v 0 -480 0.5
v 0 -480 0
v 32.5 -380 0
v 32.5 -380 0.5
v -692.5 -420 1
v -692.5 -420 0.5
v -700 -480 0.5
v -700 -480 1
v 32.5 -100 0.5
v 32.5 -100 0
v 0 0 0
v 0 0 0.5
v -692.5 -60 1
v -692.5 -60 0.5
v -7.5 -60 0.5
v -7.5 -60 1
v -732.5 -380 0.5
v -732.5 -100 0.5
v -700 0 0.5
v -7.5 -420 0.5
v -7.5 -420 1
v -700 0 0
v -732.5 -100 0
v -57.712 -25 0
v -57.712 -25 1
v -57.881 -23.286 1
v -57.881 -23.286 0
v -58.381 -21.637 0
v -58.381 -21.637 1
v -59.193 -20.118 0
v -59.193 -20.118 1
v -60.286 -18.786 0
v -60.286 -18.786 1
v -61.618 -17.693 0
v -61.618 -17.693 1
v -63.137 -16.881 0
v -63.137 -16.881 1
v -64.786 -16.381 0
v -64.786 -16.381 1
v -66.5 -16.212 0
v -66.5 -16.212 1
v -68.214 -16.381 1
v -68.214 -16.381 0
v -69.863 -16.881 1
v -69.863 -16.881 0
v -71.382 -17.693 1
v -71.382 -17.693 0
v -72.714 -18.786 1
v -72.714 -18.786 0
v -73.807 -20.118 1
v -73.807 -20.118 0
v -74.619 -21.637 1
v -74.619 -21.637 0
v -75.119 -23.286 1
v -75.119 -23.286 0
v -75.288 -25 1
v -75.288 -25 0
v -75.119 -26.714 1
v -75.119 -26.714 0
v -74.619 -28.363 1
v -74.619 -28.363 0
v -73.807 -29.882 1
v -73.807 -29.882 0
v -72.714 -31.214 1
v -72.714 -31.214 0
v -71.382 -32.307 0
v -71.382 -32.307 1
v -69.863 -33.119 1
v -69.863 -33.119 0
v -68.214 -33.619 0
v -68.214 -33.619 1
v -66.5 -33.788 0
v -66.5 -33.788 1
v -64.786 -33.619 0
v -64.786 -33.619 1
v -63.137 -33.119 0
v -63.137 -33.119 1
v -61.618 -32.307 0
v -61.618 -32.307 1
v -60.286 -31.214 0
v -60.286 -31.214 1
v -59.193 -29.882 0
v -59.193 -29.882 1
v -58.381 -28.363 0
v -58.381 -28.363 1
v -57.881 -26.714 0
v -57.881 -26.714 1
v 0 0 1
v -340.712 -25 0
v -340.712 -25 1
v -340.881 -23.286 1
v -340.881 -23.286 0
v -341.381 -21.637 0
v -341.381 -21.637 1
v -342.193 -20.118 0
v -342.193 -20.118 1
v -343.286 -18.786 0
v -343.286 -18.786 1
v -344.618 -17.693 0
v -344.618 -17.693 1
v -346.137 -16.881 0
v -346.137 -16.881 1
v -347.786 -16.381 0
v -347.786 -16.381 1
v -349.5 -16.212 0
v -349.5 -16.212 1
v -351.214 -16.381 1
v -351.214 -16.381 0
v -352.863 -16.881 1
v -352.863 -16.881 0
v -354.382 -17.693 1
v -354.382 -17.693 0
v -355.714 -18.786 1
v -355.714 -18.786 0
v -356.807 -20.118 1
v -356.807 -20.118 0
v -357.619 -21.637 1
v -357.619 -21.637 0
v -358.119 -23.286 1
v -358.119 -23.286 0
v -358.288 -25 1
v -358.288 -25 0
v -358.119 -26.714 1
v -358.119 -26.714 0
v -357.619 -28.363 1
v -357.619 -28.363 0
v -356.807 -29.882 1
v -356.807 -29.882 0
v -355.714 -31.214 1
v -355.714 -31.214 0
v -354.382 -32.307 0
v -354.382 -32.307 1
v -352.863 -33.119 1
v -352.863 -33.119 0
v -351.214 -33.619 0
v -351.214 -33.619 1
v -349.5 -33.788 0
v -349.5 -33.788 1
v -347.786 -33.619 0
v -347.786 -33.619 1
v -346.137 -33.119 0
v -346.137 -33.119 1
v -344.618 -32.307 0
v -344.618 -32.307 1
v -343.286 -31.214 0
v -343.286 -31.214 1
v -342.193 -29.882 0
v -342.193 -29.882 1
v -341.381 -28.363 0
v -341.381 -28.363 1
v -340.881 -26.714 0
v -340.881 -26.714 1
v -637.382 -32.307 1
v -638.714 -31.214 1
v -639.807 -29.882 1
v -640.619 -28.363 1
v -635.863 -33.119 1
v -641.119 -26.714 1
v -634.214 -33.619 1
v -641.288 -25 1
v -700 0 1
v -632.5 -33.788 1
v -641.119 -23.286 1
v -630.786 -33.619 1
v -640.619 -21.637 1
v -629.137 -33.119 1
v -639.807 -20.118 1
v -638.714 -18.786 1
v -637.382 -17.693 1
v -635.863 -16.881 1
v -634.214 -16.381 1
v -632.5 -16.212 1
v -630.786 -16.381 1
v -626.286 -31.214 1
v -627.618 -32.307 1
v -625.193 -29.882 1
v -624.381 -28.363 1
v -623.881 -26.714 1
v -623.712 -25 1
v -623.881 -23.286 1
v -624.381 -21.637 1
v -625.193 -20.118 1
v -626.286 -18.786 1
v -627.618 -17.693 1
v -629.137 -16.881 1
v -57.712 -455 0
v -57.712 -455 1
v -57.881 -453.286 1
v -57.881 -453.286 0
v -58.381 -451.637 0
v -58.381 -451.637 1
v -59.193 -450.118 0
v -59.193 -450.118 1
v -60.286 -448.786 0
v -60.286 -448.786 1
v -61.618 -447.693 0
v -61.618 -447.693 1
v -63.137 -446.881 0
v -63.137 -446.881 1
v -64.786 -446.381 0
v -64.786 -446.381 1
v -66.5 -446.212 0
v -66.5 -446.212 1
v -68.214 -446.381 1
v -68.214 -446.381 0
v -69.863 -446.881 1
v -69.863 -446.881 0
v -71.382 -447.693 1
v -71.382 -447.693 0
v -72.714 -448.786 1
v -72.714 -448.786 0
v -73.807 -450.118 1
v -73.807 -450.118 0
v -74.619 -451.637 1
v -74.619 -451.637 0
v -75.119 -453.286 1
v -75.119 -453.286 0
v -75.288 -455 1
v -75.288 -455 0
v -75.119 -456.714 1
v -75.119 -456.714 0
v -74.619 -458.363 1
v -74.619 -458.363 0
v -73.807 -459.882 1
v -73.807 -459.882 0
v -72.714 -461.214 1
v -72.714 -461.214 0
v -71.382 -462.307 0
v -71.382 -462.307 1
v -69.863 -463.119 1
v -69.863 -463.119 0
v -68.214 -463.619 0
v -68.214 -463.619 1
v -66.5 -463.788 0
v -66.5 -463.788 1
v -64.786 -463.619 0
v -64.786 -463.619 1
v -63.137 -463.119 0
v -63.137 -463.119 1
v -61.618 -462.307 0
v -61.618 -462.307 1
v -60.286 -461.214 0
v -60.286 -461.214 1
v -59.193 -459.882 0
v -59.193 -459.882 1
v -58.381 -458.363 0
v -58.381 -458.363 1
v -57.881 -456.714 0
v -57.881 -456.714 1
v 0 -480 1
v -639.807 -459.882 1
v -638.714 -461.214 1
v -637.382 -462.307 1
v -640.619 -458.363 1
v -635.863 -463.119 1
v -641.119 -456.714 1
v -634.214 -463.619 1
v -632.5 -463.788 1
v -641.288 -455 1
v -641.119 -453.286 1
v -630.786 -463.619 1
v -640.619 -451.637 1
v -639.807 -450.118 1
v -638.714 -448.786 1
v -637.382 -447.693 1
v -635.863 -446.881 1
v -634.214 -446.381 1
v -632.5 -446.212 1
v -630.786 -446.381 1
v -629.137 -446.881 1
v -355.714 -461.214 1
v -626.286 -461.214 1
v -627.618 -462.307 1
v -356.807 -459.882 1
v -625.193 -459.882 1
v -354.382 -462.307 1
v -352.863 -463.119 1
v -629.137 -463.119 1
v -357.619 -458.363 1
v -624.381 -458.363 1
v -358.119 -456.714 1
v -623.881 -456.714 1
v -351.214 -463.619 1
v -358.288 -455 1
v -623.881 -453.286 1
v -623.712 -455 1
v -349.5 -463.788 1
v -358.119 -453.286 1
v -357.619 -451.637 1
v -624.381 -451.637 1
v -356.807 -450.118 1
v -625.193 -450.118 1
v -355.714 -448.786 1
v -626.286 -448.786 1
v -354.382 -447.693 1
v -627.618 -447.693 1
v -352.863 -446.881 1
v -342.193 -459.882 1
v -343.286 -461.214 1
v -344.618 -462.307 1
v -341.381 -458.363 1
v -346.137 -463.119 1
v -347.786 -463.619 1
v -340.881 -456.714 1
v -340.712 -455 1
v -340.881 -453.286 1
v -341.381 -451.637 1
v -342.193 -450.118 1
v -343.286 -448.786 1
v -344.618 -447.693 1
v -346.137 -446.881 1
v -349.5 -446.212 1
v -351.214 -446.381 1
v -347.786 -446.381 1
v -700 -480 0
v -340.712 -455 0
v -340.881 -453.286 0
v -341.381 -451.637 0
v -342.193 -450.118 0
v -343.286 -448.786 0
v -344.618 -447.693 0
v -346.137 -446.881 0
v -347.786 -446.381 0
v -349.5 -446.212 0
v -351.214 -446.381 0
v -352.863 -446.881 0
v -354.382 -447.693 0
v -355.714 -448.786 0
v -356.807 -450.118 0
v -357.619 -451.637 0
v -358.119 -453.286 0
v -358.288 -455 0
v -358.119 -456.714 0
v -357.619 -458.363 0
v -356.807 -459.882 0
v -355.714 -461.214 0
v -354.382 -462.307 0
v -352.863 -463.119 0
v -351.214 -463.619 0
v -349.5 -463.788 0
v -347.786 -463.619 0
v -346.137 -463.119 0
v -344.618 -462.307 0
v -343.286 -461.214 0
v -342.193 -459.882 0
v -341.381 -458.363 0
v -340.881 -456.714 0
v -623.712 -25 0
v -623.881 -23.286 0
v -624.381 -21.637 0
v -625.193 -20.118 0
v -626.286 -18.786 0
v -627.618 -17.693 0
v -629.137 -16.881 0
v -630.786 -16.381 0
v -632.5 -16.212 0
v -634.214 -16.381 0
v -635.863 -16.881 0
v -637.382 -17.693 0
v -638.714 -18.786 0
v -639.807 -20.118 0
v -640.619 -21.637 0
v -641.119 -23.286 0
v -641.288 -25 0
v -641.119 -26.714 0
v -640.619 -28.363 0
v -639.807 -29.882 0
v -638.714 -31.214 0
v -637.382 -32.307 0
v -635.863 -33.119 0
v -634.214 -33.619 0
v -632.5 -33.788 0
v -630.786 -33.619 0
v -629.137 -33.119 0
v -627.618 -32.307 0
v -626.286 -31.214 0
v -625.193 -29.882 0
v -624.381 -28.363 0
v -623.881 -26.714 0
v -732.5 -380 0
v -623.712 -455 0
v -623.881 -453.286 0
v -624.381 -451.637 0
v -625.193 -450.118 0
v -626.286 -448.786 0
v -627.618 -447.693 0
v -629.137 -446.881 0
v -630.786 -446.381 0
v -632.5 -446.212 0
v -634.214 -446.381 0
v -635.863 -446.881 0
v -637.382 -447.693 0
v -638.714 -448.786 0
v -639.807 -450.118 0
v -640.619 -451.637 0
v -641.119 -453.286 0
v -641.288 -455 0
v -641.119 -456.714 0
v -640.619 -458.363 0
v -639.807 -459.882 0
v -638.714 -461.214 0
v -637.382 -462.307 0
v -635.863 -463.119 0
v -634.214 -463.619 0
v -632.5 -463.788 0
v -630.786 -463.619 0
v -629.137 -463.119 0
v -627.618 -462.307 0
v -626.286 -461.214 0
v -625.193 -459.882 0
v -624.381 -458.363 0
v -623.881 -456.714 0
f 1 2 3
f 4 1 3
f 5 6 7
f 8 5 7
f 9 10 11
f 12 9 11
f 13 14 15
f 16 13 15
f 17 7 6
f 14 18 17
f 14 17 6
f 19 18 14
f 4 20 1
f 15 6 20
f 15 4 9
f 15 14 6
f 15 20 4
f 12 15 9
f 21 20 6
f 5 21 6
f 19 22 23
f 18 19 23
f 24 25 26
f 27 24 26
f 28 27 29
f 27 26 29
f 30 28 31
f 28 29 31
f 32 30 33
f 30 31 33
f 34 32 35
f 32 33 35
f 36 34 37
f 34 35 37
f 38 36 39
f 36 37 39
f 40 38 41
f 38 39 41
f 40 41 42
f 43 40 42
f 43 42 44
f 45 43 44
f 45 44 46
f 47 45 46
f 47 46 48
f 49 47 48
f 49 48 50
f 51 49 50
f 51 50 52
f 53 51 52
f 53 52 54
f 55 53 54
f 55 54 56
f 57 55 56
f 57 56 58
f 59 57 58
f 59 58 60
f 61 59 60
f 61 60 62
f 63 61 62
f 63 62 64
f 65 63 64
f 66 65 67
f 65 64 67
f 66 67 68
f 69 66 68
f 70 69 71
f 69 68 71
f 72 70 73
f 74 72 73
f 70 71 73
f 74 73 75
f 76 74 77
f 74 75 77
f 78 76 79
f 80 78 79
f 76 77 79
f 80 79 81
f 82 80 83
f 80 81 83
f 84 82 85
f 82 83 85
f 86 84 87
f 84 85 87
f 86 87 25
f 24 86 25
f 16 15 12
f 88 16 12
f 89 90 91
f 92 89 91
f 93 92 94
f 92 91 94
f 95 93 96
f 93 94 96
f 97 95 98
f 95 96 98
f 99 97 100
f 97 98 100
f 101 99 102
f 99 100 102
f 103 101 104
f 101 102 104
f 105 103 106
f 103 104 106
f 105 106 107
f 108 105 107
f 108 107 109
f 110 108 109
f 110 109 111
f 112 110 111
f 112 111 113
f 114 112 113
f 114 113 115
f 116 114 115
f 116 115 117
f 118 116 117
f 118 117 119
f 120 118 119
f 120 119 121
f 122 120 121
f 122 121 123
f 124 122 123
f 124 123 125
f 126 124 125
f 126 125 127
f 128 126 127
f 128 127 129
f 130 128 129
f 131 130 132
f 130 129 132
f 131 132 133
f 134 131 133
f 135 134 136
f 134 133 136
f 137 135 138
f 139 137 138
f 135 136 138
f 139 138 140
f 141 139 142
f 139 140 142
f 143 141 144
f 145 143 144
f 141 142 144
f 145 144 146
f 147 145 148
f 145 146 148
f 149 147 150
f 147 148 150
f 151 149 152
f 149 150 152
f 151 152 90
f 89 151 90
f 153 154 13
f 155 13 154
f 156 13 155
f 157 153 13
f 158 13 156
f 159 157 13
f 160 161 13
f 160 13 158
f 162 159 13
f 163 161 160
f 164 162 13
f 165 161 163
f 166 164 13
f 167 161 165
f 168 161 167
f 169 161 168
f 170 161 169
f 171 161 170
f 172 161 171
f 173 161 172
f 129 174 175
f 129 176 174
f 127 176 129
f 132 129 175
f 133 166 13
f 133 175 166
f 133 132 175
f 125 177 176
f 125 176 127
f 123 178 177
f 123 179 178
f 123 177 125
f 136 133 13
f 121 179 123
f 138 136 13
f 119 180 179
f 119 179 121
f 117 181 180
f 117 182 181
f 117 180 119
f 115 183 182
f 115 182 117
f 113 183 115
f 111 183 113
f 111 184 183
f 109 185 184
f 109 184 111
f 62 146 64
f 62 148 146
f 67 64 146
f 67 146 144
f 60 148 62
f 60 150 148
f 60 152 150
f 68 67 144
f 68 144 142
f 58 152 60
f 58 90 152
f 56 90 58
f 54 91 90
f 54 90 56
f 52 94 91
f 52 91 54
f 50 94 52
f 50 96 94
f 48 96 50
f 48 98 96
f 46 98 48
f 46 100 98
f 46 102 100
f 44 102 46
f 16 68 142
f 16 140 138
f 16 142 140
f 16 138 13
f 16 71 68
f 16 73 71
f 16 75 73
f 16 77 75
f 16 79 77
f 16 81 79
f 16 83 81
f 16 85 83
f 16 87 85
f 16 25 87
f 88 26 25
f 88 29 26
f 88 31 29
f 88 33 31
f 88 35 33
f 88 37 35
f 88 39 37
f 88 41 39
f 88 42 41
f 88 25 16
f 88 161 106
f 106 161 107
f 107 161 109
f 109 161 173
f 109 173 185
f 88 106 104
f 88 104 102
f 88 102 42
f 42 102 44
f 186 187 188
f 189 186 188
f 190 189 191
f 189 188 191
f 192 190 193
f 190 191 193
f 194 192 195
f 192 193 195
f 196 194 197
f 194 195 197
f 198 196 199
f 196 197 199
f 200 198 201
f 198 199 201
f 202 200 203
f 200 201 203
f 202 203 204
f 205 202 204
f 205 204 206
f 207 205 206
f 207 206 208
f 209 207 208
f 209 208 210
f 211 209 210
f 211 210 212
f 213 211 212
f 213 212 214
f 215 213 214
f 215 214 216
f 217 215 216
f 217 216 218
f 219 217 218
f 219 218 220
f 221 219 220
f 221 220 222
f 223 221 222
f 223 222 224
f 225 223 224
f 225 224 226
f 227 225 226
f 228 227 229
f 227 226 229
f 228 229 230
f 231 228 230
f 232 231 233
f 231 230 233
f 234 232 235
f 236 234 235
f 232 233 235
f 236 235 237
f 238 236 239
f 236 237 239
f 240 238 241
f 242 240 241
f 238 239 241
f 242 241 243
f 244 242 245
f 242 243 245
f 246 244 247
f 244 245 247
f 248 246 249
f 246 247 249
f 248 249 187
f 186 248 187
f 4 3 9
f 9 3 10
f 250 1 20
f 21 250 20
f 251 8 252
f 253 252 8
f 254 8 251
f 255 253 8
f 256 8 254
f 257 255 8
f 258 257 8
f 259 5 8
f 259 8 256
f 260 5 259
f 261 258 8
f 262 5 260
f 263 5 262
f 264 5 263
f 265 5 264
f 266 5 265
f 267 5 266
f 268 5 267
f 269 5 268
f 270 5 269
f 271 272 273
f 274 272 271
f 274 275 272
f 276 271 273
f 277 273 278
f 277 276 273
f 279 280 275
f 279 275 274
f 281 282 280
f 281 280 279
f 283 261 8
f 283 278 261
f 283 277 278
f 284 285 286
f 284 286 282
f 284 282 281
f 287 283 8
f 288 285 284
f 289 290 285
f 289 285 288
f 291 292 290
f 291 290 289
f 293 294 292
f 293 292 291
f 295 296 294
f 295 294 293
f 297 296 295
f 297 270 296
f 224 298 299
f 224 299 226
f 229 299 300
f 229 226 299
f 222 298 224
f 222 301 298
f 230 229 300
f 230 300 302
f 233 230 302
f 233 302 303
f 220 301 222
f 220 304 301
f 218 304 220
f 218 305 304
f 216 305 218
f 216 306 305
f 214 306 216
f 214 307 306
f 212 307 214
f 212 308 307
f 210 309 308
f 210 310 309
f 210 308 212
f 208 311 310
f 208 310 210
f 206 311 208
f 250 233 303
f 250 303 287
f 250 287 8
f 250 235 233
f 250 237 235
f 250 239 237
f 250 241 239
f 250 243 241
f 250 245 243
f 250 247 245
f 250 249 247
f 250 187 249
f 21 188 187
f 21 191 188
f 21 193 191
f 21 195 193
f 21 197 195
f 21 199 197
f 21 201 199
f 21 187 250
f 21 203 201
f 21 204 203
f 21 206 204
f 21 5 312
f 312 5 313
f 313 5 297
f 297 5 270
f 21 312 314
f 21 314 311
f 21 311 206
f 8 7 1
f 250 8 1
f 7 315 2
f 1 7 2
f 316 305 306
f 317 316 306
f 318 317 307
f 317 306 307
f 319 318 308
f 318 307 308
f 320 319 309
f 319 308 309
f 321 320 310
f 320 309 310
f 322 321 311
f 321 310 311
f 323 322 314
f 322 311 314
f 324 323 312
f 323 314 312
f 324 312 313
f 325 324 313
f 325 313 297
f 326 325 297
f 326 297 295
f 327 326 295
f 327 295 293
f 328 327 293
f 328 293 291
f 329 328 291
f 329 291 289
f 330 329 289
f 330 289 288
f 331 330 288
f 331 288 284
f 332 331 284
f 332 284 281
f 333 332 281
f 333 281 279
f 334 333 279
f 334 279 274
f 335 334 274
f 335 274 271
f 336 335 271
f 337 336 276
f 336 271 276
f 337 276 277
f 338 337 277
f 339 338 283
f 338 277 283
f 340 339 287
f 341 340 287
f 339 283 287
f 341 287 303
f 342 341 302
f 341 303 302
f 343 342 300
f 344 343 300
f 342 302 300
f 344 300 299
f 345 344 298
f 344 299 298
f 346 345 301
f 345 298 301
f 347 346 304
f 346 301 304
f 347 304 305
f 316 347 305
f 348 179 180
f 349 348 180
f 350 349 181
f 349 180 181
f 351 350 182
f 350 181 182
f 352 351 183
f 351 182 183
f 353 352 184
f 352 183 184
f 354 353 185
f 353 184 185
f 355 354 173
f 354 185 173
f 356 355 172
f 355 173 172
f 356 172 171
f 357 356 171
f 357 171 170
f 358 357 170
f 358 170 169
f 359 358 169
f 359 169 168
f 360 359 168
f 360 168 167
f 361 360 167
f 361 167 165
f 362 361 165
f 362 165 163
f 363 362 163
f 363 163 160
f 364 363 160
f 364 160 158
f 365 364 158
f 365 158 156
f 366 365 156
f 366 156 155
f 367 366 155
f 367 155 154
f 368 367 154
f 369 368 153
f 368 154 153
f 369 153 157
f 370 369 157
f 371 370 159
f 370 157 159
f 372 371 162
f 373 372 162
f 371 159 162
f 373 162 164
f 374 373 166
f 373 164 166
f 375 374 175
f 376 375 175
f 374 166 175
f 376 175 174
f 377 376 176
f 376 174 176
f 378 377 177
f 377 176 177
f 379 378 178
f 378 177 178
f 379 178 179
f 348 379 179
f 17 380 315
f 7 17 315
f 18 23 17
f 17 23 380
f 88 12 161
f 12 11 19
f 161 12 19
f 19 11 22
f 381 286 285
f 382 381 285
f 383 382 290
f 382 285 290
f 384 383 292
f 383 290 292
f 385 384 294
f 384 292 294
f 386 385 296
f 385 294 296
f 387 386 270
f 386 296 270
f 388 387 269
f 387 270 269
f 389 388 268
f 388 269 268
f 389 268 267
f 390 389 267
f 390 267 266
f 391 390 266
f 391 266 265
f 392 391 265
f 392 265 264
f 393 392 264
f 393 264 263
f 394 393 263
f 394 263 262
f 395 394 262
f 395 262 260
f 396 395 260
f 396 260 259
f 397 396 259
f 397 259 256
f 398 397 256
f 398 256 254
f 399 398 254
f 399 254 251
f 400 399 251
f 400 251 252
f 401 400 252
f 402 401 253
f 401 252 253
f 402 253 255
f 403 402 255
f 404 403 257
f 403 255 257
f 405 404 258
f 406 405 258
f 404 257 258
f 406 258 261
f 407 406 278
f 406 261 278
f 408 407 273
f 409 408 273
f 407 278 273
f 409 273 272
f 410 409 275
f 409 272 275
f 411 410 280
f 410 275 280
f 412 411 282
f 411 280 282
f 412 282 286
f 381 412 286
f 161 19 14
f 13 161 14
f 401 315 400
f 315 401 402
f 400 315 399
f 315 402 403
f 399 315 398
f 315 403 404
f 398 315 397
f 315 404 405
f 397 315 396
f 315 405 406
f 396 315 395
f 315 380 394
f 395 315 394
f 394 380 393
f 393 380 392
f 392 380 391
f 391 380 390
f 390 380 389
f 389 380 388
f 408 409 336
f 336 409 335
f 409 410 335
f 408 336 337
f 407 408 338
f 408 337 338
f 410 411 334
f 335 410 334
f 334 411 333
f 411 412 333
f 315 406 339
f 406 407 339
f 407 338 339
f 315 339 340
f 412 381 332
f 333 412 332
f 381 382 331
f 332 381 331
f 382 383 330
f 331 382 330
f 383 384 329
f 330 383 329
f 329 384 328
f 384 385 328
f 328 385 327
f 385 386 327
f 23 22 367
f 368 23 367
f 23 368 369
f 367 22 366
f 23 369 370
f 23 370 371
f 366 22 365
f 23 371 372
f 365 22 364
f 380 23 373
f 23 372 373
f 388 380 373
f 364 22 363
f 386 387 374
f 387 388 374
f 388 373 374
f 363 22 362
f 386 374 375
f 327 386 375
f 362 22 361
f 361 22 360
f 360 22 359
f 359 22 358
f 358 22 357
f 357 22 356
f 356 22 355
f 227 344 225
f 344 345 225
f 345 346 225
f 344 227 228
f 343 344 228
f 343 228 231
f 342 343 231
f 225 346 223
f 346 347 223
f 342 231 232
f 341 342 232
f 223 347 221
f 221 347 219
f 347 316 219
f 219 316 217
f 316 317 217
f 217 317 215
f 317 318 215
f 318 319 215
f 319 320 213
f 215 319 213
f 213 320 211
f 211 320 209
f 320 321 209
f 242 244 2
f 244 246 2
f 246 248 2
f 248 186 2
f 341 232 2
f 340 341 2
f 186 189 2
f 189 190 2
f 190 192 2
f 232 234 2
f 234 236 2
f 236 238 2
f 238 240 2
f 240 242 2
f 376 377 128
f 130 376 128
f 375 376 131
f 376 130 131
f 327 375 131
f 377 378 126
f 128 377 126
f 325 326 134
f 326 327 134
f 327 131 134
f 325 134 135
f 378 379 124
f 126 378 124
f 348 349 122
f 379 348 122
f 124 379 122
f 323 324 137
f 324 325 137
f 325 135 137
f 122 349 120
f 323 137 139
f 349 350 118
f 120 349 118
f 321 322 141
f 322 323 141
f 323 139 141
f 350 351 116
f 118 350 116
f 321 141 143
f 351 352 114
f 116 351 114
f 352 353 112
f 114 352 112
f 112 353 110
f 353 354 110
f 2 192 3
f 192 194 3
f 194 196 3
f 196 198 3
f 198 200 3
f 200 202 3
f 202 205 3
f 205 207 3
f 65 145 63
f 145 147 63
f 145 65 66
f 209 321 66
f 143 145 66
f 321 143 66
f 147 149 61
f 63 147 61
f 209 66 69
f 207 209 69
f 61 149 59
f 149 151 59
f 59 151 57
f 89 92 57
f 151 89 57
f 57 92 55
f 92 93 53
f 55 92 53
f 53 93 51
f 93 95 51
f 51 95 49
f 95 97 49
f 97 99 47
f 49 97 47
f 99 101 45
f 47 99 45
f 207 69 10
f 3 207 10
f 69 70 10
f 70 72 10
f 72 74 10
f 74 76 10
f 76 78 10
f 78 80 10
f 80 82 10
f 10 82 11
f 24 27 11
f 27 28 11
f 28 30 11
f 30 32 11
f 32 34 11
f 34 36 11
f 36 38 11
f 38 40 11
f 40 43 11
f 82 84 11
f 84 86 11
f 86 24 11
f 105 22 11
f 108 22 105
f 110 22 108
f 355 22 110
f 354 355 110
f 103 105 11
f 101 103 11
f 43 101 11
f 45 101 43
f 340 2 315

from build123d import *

# Parameters (mm, degrees)
F1_DEPTH = 0.5
F3_DEPTH = 0.5
F4_R     = 8.788165
F5_DEPTH = 1.001


with BuildPart() as f1:
    # F0 (on Top) → F1 (new body)
    with BuildSketch(Plane.XY):
        Polygon((0, 0), (-700, 0), (-732.5, -100), (-732.5, -240), (-732.5, -380), (-700, -480), (0, -480), (32.5, -380), (32.5, -240), (32.5, -100), align=None)
    extrude(amount=F1_DEPTH)

    # F2 (on face) → F3 (join)
    with BuildSketch(Plane.XY.offset(0.5)):
        Polygon((0, 0), (-700, 0), (-692.5, -60), (-7.5, -60), align=None)
        Polygon((-692.5, -420), (-700, -480), (0, -480), (-7.5, -420), align=None)
    extrude(amount=F3_DEPTH)

    # F4 (on face) → F5 (cut, through all)
    with BuildSketch(Plane.XY.offset(1)):
        with Locations((-632.5, -25)):
            Circle(F4_R)
        with Locations((-632.5, -455)):
            Circle(F4_R)
        with Locations((-349.5, -25)):
            Circle(F4_R)
        with Locations((-349.5, -455)):
            Circle(F4_R)
        with Locations((-66.5, -25)):
            Circle(F4_R)
        with Locations((-66.5, -455)):
            Circle(F4_R)
    extrude(amount=-F5_DEPTH, mode=Mode.SUBTRACT)


solid = f1.part
